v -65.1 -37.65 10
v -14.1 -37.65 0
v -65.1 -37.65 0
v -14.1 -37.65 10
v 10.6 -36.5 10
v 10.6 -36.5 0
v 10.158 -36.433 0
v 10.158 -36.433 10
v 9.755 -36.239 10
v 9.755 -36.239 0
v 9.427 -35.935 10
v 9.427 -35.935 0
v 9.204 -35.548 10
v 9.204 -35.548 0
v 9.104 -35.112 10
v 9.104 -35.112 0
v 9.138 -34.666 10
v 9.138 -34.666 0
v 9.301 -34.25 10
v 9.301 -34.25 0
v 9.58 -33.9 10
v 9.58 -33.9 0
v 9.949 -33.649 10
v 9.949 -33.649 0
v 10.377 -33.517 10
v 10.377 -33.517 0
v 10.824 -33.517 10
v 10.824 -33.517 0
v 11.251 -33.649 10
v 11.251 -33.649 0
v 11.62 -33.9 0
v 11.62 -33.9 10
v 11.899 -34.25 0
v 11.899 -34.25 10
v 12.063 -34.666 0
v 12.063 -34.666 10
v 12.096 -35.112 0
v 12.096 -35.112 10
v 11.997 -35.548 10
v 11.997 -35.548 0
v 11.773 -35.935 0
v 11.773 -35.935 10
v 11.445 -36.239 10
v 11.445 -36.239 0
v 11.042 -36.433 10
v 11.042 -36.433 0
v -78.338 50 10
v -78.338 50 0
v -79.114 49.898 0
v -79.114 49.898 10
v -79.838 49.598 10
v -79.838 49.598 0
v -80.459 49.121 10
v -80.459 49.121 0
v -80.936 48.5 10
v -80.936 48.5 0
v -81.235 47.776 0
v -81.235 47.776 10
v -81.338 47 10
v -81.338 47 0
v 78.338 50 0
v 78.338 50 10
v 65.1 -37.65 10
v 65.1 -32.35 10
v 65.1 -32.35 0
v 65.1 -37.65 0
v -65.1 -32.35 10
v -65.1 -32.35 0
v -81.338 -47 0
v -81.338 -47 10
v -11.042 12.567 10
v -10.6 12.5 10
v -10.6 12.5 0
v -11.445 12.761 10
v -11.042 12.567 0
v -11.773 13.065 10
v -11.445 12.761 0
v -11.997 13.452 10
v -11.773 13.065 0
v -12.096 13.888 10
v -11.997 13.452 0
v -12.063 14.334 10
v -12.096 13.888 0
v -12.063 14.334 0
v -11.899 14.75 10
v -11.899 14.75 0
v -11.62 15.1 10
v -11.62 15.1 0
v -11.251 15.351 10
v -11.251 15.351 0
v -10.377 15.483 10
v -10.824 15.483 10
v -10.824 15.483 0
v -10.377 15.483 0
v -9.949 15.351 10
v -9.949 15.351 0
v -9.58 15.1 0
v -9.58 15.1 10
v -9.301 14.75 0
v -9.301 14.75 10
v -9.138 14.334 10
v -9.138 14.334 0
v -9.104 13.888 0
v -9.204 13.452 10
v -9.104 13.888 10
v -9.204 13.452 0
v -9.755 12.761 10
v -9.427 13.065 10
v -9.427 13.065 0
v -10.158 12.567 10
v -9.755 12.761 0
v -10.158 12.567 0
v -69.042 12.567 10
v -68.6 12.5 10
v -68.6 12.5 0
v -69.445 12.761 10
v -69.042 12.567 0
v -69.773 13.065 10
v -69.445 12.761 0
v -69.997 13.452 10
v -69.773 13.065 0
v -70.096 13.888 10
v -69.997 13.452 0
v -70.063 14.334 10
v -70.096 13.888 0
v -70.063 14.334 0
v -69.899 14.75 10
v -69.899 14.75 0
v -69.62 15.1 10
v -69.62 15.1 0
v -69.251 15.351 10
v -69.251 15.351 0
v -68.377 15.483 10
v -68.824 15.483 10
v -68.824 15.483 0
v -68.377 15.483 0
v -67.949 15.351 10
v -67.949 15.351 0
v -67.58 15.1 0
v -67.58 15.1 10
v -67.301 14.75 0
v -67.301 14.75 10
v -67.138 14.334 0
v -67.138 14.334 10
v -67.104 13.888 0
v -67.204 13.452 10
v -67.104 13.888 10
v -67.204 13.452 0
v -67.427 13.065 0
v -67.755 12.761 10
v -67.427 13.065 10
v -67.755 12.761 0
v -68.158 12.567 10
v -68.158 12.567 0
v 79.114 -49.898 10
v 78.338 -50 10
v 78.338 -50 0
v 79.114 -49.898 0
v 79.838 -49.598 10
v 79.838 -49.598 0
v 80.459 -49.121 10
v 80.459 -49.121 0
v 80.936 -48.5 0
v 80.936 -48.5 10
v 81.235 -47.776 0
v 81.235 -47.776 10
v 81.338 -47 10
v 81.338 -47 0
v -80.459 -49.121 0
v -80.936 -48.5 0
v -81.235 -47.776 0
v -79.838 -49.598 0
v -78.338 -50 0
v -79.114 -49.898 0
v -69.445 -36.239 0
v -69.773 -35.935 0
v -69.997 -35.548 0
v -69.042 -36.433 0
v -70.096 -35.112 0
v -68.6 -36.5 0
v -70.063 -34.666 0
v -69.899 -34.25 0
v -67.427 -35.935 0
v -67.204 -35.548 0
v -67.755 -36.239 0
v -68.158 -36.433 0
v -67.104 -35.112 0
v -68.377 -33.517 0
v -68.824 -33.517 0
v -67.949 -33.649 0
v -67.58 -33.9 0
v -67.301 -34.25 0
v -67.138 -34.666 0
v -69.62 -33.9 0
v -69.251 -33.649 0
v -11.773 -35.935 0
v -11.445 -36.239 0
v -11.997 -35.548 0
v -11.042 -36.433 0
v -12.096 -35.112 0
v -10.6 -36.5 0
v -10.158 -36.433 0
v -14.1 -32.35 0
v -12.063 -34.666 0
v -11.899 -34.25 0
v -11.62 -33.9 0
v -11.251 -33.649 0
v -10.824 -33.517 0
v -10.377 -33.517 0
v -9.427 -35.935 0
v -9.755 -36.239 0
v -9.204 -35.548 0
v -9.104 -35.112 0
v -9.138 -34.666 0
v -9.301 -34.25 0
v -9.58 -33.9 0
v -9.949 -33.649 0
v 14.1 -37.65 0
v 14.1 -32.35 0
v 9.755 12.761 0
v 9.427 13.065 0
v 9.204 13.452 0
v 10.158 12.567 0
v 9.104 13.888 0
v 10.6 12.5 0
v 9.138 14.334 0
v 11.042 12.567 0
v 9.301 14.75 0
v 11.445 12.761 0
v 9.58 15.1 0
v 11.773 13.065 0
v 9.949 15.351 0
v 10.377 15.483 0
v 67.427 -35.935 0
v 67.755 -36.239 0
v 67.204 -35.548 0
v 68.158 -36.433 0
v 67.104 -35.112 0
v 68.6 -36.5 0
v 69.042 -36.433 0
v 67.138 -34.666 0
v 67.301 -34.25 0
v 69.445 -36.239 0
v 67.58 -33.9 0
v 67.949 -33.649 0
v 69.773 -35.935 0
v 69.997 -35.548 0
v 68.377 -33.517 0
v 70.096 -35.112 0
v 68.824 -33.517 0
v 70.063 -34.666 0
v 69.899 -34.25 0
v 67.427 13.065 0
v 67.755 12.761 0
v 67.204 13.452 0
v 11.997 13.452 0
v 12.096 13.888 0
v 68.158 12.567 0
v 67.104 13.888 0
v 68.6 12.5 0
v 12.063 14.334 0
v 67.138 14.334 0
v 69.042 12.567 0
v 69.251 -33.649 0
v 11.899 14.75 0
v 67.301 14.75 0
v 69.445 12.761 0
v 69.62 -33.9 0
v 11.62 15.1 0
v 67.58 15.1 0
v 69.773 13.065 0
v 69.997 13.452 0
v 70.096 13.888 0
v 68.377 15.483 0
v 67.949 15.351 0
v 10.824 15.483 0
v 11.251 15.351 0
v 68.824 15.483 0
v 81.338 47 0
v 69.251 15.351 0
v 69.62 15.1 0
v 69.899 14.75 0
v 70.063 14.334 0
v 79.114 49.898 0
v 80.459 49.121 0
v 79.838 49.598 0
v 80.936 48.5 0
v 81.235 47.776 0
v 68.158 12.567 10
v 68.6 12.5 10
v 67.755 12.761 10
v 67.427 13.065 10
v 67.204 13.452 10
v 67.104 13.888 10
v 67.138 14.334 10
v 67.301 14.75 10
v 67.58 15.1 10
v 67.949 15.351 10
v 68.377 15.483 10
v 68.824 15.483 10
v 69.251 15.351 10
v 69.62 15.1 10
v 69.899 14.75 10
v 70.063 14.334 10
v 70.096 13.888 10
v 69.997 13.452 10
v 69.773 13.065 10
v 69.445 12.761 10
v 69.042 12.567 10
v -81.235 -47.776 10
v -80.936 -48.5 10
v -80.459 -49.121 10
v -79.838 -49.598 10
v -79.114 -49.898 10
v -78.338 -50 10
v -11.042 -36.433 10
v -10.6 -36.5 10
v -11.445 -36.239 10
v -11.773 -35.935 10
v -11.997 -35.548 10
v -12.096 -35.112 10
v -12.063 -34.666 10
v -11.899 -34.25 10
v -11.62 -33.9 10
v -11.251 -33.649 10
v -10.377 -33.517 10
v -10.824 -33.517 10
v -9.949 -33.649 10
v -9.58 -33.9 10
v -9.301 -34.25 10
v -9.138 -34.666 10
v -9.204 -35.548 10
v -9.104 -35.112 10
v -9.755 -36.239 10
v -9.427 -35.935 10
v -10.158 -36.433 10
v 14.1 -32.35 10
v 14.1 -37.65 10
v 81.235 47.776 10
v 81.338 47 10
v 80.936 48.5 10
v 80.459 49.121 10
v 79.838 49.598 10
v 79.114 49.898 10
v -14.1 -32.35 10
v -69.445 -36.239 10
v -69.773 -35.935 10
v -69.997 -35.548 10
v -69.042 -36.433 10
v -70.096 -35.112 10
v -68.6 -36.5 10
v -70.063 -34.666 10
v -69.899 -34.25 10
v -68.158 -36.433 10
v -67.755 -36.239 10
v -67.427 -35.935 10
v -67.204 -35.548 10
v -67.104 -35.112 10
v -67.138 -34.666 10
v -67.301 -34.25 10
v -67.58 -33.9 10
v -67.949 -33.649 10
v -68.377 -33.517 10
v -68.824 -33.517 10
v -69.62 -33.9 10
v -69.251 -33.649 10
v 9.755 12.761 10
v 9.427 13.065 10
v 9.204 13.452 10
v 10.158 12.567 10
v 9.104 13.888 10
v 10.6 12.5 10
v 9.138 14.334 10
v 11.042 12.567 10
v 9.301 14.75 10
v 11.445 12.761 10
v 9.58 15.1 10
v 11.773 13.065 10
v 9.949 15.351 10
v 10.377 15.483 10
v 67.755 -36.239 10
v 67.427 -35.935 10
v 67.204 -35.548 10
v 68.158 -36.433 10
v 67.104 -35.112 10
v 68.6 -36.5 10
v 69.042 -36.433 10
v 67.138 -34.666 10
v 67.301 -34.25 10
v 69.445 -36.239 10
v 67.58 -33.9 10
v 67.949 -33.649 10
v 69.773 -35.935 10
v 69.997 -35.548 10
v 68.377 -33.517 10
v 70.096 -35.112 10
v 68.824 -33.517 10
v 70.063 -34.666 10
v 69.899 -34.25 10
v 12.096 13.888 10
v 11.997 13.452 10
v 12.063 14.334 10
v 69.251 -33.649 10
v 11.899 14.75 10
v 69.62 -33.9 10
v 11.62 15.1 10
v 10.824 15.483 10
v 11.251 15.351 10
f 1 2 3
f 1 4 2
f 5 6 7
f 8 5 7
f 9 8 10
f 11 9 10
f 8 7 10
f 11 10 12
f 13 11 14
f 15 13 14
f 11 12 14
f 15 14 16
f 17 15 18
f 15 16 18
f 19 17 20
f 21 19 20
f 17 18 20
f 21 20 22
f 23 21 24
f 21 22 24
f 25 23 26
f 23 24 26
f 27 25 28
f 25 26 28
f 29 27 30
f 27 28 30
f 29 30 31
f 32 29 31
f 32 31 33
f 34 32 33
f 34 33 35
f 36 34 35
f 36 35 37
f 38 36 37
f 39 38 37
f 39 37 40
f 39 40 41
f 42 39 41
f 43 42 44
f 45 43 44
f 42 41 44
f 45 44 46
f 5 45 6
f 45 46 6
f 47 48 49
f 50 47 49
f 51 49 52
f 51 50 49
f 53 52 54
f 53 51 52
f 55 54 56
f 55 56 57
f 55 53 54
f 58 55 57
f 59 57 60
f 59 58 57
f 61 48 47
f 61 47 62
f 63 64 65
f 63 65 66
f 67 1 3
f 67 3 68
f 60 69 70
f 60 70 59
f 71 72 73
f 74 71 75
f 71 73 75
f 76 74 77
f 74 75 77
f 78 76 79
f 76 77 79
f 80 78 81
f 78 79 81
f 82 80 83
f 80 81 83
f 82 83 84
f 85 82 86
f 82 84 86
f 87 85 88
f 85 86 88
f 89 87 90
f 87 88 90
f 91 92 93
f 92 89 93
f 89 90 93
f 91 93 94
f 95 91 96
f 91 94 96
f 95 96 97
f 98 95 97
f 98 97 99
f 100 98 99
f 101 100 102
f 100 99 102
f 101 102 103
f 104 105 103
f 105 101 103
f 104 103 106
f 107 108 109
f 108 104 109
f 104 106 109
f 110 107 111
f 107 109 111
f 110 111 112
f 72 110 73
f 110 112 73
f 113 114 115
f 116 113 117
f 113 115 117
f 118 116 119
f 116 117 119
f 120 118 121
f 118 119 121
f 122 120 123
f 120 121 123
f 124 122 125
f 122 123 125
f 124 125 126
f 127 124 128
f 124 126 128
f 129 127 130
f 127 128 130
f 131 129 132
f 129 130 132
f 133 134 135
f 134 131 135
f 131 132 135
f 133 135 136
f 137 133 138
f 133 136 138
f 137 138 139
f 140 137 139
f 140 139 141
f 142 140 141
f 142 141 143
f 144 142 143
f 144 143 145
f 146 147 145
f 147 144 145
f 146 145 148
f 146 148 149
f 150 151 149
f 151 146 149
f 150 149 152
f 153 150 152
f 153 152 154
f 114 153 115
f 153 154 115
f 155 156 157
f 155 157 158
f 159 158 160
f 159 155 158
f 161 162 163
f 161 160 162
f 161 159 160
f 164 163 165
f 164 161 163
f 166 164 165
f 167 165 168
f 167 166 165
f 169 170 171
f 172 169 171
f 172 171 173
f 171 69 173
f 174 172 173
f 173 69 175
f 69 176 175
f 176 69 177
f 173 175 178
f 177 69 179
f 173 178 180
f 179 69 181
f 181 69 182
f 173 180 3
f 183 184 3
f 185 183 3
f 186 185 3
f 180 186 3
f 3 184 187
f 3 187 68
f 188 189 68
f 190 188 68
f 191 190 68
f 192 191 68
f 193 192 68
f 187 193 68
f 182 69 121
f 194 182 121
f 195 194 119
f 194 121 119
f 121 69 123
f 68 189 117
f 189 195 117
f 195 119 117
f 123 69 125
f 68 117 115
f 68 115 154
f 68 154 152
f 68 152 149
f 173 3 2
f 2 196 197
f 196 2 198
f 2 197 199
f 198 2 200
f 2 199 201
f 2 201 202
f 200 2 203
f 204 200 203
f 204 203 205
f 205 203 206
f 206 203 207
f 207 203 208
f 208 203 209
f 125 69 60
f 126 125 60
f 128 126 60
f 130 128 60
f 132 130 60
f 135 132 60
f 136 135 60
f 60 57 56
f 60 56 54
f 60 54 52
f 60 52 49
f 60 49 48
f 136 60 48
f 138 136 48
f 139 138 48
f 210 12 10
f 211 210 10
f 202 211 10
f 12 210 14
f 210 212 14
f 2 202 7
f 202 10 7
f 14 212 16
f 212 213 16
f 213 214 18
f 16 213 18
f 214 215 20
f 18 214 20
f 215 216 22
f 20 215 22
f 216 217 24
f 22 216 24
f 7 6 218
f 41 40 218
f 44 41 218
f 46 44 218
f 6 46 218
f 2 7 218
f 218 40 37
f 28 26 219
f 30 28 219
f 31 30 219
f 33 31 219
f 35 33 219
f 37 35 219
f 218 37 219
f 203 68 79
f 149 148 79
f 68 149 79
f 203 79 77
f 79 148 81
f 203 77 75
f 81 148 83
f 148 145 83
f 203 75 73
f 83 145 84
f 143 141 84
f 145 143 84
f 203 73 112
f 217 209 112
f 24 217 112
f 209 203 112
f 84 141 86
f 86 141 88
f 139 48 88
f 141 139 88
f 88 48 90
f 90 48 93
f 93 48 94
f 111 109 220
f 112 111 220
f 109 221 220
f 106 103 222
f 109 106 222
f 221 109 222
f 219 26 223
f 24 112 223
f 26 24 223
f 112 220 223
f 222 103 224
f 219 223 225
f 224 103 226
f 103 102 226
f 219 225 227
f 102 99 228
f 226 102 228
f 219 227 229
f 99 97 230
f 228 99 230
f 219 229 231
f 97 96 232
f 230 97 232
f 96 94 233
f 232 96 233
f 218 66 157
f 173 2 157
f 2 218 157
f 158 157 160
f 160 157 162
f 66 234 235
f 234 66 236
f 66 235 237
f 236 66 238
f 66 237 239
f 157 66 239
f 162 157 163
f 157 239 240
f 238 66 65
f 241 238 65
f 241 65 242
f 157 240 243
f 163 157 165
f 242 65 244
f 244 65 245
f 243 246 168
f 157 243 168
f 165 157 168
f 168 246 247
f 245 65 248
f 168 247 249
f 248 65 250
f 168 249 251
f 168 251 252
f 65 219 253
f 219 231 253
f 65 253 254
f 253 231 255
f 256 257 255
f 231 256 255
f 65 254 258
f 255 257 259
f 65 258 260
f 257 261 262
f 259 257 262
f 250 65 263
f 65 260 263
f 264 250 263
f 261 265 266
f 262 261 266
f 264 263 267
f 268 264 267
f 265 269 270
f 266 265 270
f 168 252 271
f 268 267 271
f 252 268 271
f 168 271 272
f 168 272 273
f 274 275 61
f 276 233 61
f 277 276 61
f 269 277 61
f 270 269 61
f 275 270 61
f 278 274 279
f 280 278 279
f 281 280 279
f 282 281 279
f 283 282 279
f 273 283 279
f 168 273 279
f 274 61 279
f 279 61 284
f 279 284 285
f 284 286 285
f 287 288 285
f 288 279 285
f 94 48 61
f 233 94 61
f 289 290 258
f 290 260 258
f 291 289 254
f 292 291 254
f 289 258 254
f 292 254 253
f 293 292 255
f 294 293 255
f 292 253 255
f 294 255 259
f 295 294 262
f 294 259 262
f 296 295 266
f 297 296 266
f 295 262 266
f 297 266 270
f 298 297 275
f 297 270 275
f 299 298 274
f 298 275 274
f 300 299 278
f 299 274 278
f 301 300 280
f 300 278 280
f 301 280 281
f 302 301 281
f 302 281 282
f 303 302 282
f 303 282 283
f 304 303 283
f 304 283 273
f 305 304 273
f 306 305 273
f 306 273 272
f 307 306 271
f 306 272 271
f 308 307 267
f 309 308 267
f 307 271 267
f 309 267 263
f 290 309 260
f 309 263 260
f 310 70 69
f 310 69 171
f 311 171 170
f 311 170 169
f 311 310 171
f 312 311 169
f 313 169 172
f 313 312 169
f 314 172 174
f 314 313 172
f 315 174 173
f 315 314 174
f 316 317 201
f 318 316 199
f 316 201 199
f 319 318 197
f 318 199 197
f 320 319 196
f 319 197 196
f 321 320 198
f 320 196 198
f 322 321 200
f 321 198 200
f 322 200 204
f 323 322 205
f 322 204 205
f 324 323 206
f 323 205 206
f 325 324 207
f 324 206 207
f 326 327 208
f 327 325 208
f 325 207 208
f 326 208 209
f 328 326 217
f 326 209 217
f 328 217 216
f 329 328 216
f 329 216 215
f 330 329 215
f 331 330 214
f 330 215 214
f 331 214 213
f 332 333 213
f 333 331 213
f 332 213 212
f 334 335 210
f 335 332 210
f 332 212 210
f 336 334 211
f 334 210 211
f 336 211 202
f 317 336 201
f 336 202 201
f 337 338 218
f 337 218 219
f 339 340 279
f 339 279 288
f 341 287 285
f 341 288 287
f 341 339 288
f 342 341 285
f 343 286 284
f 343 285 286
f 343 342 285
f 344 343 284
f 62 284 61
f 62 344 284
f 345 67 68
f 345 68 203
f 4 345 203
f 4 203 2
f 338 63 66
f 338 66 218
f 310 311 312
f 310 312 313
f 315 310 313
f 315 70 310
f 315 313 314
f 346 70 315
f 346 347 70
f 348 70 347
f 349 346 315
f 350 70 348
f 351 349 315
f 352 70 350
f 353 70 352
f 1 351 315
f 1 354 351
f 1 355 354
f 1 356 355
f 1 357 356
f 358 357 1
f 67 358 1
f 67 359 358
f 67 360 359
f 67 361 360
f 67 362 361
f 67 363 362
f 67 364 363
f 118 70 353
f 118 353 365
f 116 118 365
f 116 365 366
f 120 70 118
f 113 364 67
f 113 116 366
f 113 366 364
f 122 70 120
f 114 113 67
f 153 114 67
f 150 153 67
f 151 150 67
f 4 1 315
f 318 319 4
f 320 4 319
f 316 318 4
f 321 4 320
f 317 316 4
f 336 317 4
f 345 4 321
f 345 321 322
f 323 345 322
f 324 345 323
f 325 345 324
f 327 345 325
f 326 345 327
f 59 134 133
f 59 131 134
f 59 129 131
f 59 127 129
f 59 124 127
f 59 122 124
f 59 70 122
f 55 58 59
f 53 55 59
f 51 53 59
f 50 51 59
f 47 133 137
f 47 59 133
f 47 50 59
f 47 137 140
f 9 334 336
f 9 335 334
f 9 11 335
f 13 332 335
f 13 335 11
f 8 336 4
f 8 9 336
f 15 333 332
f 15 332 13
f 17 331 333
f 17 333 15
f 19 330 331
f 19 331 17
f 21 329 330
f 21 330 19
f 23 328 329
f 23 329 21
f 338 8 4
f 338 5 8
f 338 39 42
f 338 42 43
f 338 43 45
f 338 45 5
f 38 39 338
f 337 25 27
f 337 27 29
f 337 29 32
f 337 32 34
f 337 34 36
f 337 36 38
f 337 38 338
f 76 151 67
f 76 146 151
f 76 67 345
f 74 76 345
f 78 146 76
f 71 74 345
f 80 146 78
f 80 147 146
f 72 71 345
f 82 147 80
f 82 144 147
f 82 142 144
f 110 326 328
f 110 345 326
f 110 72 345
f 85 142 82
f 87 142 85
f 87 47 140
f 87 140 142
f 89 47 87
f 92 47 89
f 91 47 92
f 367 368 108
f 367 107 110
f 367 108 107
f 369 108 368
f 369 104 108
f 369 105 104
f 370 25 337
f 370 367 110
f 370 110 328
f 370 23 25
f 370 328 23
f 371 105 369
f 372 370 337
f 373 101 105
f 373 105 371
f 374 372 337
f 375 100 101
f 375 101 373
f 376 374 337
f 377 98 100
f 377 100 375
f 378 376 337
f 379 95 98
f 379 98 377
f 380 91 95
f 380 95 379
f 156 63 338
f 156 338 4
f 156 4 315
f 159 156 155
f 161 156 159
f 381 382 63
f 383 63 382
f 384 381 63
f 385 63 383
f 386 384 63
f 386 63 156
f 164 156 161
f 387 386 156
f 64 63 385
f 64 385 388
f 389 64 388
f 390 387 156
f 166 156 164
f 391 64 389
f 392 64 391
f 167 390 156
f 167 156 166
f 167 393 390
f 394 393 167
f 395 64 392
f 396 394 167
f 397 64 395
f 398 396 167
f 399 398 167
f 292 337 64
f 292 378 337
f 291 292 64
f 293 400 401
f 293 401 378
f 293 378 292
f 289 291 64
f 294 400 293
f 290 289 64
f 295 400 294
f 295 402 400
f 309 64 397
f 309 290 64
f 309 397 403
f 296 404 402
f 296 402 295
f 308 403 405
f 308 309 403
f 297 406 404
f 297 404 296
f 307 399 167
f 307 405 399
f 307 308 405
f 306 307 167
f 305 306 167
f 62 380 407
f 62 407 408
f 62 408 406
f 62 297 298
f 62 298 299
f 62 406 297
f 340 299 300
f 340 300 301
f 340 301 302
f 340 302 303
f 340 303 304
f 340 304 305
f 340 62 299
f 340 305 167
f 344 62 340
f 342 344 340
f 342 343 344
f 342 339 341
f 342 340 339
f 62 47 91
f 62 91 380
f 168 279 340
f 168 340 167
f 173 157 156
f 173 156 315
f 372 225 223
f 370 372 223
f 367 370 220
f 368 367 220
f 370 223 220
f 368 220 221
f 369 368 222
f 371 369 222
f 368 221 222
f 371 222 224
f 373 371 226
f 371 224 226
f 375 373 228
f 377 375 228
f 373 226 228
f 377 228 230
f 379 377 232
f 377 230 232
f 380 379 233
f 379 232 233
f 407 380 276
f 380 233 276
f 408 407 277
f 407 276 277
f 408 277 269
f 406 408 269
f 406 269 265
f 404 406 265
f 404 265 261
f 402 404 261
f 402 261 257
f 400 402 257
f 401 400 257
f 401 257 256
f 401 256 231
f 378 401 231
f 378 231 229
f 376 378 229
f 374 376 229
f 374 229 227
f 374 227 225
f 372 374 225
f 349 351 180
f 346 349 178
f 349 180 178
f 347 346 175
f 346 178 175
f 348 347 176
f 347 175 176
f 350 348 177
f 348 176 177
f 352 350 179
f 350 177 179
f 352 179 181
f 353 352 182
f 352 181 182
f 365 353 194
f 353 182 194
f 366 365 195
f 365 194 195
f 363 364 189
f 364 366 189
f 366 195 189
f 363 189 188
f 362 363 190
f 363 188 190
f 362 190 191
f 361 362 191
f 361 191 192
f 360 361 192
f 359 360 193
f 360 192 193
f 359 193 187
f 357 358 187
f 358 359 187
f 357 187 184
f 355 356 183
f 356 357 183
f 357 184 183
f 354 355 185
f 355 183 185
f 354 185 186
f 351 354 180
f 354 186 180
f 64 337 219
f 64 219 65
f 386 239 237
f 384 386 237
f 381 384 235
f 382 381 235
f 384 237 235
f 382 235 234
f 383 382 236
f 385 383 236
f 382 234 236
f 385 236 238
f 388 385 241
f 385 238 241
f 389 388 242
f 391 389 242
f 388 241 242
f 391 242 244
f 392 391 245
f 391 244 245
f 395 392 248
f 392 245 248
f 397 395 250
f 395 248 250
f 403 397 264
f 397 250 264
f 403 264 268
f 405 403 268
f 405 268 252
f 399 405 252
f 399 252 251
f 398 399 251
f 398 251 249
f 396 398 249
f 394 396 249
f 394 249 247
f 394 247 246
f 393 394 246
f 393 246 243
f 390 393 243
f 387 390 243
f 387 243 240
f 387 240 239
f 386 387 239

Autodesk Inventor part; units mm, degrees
ref_plane "YZ Plane" through (0, 0, 0) normal (1, 0, 0) x (0, 1, 0)
ref_plane "XZ Plane" through (0, 0, 0) normal (0, 1, 0) x (-1, 0, 0)
ref_plane "XY Plane" through (0, 0, 0) normal (0, 0, 1) x (1, 0, 0)
sketch "Sketch1" plane through (0, 0, 0) normal (0, 0, 1) x (1, 0, 0)
  line L0 (-81.3375, 50) -> (81.3375, 50)
  line L1 (81.3375, 50) -> (81.3375, -50)
  line L2 (81.3375, -50) -> (-81.3375, -50)
  line L3 (-81.3375, -50) -> (-81.3375, 50)
  point P0 (0, 0)
  point P1 (0, 50)
  point P2 (81.3375, 0)
  dimension "d0" = 100
  dimension "d1" = 162.675
extrude "Extrusion1" add sketch "Sketch1" along normal blind 10
sketch "Sketch2" plane through (0, 0, 10) normal (0, 0, 1) x (1, 0, 0)
  line L0 (10.6002, 14) -> (68.6002, 14) construction
  line L1 (68.6002, 14) -> (68.6002, -35) construction
  line L2 (68.6002, -35) -> (10.6002, -35) construction
  line L3 (10.6002, -35) -> (10.6002, 14) construction
  line L4 (-81.3375, -50) -> (81.3375, -50) projected
  point P0 (0, 0)
  dimension "d4" = 58
  dimension "d5" = 49
  dimension "d18" = 15
hole "Hole1" at (10.6002, 14, 10) at (68.6002, 14, 10) at (68.6002, -35, 10) at (10.6002, -35, 10) direction (0, 0, -1) diameter 3 end through all
sketch "Sketch3" plane through (0, 0, 10) normal (0, 0, 1) x (1, 0, 0)
  line L0 (14.1002, -32.35) -> (65.1002, -32.35)
  line L1 (65.1002, -32.35) -> (65.1002, -37.65)
  line L2 (65.1002, -37.65) -> (14.1002, -37.65)
  line L3 (14.1002, -37.65) -> (14.1002, -32.35)
  circle A0 centre (68.6002, -35) radius 1.5 projected
  circle A1 centre (10.6002, -35) radius 1.5 projected
  line L4 (10.6002, -35) -> (68.6002, -35) construction
  point P0 (0, 0)
  point P1 (65.1002, -35)
  point P2 (39.6002, -35)
  point P3 (39.6002, -32.35)
  dimension "d14" = 5.3
  dimension "d15" = 51
extrude "Extrusion2" cut sketch "Sketch3" against normal through all contours L0 L1 L2 L3
mirror "Mirror1" about plane through (0, 0, 0) normal (1, 0, 0) of "Hole1", "Extrusion2"
fillet "Fillet1" radius 3 4 edges at (81.3375, 50, 5) (-81.3375, 50, 5) (-81.3375, -50, 5) (81.3375, -50, 5)
equation "\"d1\" = 2.5 * width"
equation "\"hight\" = 56.21"
equation "\"width\" = 65.07"
properties part number "RasPi-Hat-outline"
